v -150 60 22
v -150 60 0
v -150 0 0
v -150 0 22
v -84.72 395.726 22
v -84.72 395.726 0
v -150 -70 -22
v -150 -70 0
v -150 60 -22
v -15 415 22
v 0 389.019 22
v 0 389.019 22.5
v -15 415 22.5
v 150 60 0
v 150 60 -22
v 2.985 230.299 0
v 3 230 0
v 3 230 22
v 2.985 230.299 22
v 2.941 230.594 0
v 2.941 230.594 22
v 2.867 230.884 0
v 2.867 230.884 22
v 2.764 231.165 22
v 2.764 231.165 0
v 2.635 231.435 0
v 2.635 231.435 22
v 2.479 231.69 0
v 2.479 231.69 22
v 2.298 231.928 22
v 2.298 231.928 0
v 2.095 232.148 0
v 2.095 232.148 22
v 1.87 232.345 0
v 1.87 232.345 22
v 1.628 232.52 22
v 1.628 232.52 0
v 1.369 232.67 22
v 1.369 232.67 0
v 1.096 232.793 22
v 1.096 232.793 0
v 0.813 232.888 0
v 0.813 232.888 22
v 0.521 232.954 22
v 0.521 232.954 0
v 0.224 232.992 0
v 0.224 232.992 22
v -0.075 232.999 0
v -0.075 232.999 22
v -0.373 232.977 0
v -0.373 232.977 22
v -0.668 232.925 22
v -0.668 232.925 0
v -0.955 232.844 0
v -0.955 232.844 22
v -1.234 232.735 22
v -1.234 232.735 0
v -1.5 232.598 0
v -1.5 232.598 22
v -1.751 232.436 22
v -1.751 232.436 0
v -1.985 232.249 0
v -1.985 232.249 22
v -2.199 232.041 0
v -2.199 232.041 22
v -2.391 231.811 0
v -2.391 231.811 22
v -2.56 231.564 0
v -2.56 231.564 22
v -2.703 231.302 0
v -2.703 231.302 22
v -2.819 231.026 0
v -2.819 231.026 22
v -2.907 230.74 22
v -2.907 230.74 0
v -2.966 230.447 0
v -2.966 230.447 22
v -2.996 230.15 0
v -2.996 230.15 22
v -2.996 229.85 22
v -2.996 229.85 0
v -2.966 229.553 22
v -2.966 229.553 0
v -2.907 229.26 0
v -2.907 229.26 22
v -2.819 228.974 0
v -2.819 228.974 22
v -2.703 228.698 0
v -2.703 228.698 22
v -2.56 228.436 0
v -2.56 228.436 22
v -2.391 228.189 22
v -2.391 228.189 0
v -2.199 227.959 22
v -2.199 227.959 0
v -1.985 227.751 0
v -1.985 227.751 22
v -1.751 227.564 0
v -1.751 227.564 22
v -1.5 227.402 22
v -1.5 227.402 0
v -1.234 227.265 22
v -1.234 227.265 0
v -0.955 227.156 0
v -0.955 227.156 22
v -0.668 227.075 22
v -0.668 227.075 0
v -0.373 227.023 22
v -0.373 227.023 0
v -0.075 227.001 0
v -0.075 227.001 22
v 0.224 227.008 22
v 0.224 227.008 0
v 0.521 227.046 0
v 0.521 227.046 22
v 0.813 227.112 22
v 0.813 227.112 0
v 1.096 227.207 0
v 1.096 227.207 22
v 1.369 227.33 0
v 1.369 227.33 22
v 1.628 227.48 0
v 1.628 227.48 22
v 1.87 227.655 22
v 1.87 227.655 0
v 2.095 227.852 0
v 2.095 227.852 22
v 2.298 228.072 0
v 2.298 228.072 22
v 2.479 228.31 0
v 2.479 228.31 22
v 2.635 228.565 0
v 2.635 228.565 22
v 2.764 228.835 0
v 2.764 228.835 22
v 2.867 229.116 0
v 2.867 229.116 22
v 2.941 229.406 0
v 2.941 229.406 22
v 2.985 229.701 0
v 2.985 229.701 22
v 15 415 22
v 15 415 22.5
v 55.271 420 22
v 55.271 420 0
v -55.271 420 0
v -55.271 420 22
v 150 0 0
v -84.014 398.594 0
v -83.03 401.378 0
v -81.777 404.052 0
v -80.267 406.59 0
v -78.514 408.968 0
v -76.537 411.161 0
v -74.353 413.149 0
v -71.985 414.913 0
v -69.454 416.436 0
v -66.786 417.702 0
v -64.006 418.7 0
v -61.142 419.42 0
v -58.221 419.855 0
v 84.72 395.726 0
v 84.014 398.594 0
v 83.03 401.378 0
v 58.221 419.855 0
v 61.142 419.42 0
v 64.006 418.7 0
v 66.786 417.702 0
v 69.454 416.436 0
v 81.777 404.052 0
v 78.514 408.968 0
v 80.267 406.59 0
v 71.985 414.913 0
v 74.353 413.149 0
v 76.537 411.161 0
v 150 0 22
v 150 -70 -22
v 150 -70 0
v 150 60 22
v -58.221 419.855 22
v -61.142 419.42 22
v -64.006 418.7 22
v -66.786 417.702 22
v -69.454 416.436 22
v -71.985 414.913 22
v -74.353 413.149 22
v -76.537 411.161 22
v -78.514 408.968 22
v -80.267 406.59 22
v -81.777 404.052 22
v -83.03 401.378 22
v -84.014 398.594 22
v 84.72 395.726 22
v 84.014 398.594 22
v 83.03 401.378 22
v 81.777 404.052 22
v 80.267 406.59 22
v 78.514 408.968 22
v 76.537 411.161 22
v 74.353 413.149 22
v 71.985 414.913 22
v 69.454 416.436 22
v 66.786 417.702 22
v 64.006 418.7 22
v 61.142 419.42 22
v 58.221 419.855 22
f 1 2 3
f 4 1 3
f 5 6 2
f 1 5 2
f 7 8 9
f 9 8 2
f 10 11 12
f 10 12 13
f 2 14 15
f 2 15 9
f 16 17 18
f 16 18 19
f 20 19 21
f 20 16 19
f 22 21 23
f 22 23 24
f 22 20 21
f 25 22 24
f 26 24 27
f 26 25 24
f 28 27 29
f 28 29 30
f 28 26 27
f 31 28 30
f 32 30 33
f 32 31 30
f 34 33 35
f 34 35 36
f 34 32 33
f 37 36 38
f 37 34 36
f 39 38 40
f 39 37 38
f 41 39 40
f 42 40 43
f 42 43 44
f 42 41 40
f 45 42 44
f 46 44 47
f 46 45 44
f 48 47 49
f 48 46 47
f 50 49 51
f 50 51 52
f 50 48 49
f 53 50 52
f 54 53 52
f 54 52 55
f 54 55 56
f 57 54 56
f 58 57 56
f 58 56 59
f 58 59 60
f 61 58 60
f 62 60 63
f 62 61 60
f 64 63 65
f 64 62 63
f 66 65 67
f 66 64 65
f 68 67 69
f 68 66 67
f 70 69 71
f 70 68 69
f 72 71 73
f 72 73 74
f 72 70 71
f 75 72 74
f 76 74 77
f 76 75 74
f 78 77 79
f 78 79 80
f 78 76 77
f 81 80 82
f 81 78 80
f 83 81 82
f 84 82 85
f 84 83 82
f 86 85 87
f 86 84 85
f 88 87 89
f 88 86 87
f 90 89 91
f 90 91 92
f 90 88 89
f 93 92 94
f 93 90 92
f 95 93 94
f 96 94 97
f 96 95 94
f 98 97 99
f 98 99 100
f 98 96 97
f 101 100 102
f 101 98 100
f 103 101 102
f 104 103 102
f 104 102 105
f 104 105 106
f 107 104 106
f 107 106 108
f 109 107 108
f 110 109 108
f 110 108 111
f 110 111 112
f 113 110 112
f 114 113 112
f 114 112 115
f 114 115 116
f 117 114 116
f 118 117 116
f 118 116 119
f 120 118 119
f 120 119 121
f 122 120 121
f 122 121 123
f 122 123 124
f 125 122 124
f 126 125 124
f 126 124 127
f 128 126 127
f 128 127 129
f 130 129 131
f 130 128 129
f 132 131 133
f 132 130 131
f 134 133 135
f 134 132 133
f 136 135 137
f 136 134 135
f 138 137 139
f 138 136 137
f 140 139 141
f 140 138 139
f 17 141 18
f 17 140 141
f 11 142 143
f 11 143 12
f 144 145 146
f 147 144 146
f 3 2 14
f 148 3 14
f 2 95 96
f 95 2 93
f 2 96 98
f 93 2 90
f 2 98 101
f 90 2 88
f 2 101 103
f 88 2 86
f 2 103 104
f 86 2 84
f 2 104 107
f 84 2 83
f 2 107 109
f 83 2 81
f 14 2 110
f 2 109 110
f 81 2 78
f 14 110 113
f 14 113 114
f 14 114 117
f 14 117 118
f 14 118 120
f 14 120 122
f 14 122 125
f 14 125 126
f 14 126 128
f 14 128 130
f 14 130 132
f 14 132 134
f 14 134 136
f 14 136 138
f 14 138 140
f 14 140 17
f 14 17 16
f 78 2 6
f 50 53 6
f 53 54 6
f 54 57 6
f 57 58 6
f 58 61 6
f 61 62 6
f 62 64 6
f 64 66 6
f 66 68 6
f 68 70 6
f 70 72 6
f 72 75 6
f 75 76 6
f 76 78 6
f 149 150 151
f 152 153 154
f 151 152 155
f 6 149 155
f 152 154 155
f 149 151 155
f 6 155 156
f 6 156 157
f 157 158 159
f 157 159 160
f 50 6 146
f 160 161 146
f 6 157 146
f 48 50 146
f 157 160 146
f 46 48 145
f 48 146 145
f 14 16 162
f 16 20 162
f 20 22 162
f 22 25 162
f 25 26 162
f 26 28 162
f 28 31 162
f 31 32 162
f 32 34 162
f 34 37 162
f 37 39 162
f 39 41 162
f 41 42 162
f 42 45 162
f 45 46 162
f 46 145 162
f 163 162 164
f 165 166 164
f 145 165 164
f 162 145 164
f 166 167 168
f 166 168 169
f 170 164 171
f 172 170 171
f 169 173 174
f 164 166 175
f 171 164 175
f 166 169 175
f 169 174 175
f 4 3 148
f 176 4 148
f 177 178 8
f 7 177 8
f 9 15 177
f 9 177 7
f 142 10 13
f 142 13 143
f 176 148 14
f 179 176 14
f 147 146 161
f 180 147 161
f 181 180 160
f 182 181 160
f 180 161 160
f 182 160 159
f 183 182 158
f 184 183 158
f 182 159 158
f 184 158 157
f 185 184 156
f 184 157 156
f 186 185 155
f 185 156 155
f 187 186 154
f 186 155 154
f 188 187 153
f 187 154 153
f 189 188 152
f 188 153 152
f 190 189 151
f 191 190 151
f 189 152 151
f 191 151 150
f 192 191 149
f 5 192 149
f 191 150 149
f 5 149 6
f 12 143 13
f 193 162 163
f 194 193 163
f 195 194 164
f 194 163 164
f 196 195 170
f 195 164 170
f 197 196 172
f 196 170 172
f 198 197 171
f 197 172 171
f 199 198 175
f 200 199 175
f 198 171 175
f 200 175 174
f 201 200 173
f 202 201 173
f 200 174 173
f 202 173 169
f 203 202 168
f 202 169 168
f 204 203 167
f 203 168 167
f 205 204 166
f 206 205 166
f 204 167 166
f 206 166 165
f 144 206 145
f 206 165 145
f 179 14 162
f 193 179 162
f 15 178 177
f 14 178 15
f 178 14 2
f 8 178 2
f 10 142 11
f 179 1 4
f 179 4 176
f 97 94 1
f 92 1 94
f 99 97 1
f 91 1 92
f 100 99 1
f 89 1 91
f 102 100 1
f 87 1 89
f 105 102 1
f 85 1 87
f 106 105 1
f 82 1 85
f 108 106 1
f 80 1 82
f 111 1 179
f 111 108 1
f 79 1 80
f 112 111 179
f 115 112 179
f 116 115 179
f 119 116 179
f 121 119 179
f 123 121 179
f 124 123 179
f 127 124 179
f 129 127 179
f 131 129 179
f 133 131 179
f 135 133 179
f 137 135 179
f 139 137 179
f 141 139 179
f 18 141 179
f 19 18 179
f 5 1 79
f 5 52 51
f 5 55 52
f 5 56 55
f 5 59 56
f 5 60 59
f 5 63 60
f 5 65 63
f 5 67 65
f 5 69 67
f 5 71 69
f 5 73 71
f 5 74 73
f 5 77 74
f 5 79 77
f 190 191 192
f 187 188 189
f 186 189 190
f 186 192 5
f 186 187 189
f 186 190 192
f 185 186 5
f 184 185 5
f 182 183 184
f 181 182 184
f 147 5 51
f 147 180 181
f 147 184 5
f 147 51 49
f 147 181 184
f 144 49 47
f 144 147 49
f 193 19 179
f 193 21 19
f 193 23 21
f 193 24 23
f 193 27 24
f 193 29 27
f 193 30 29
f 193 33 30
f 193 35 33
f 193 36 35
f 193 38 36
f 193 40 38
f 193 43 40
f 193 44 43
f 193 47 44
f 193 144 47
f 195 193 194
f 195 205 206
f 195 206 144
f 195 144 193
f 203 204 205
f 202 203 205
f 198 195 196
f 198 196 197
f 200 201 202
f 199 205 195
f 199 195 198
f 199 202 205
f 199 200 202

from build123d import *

# Parameters (mm, degrees)
ESQUISSE1_R        = 3
BOSS_EXTRU_1_DEPTH = 22
ESQUISSE2_W        = 300
ESQUISSE2_H        = 130
BOSS_EXTRU_2_DEPTH = 22
BOSS_EXTRU_3_DEPTH = 0.5


with BuildPart() as part:
    # Esquisse1 → Boss.-Extru.1 (new body)
    with BuildSketch(Plane.XY):
        with BuildLine():
            Line((150, 60), (84.719926989, 395.726089773))
            ThreePointArc((84.719926989, 395.726089773), (74.353096607, 413.149327131), (55.271465299, 420))
            Line((55.271465299, 420), (-55.271465299, 420))
            ThreePointArc((-55.271465299, 420), (-74.353096607, 413.149327131), (-84.719926989, 395.726089773))
            Line((-84.719926989, 395.726089773), (-150, 60))
            Line((-150, 60), (-150, 0))
            Line((-150, 0), (150, 0))
            Line((150, 0), (150, 60))
        make_face()
        with Locations((0, 230)):
            Circle(ESQUISSE1_R, mode=Mode.SUBTRACT)
    extrude(amount=BOSS_EXTRU_1_DEPTH)


with BuildPart() as body_2:
    # Esquisse2 → Boss.-Extru.2 (new body)
    with BuildSketch(Plane(origin=(0, 0, 0), x_dir=(-1, 0, 0), z_dir=(0, 0, -1))):
        with Locations((0, -5)):
            Rectangle(ESQUISSE2_W, ESQUISSE2_H)
    extrude(amount=BOSS_EXTRU_2_DEPTH)


with BuildPart() as body_3:
    # Esquisse3 → Boss.-Extru.3 (new body)
    with BuildSketch(Plane.XY.offset(22)):
        Polygon((-15, 415), (15, 415), (0, 389.019237886), align=None)
    extrude(amount=BOSS_EXTRU_3_DEPTH)


solid = Compound([part.part, body_2.part, body_3.part])
